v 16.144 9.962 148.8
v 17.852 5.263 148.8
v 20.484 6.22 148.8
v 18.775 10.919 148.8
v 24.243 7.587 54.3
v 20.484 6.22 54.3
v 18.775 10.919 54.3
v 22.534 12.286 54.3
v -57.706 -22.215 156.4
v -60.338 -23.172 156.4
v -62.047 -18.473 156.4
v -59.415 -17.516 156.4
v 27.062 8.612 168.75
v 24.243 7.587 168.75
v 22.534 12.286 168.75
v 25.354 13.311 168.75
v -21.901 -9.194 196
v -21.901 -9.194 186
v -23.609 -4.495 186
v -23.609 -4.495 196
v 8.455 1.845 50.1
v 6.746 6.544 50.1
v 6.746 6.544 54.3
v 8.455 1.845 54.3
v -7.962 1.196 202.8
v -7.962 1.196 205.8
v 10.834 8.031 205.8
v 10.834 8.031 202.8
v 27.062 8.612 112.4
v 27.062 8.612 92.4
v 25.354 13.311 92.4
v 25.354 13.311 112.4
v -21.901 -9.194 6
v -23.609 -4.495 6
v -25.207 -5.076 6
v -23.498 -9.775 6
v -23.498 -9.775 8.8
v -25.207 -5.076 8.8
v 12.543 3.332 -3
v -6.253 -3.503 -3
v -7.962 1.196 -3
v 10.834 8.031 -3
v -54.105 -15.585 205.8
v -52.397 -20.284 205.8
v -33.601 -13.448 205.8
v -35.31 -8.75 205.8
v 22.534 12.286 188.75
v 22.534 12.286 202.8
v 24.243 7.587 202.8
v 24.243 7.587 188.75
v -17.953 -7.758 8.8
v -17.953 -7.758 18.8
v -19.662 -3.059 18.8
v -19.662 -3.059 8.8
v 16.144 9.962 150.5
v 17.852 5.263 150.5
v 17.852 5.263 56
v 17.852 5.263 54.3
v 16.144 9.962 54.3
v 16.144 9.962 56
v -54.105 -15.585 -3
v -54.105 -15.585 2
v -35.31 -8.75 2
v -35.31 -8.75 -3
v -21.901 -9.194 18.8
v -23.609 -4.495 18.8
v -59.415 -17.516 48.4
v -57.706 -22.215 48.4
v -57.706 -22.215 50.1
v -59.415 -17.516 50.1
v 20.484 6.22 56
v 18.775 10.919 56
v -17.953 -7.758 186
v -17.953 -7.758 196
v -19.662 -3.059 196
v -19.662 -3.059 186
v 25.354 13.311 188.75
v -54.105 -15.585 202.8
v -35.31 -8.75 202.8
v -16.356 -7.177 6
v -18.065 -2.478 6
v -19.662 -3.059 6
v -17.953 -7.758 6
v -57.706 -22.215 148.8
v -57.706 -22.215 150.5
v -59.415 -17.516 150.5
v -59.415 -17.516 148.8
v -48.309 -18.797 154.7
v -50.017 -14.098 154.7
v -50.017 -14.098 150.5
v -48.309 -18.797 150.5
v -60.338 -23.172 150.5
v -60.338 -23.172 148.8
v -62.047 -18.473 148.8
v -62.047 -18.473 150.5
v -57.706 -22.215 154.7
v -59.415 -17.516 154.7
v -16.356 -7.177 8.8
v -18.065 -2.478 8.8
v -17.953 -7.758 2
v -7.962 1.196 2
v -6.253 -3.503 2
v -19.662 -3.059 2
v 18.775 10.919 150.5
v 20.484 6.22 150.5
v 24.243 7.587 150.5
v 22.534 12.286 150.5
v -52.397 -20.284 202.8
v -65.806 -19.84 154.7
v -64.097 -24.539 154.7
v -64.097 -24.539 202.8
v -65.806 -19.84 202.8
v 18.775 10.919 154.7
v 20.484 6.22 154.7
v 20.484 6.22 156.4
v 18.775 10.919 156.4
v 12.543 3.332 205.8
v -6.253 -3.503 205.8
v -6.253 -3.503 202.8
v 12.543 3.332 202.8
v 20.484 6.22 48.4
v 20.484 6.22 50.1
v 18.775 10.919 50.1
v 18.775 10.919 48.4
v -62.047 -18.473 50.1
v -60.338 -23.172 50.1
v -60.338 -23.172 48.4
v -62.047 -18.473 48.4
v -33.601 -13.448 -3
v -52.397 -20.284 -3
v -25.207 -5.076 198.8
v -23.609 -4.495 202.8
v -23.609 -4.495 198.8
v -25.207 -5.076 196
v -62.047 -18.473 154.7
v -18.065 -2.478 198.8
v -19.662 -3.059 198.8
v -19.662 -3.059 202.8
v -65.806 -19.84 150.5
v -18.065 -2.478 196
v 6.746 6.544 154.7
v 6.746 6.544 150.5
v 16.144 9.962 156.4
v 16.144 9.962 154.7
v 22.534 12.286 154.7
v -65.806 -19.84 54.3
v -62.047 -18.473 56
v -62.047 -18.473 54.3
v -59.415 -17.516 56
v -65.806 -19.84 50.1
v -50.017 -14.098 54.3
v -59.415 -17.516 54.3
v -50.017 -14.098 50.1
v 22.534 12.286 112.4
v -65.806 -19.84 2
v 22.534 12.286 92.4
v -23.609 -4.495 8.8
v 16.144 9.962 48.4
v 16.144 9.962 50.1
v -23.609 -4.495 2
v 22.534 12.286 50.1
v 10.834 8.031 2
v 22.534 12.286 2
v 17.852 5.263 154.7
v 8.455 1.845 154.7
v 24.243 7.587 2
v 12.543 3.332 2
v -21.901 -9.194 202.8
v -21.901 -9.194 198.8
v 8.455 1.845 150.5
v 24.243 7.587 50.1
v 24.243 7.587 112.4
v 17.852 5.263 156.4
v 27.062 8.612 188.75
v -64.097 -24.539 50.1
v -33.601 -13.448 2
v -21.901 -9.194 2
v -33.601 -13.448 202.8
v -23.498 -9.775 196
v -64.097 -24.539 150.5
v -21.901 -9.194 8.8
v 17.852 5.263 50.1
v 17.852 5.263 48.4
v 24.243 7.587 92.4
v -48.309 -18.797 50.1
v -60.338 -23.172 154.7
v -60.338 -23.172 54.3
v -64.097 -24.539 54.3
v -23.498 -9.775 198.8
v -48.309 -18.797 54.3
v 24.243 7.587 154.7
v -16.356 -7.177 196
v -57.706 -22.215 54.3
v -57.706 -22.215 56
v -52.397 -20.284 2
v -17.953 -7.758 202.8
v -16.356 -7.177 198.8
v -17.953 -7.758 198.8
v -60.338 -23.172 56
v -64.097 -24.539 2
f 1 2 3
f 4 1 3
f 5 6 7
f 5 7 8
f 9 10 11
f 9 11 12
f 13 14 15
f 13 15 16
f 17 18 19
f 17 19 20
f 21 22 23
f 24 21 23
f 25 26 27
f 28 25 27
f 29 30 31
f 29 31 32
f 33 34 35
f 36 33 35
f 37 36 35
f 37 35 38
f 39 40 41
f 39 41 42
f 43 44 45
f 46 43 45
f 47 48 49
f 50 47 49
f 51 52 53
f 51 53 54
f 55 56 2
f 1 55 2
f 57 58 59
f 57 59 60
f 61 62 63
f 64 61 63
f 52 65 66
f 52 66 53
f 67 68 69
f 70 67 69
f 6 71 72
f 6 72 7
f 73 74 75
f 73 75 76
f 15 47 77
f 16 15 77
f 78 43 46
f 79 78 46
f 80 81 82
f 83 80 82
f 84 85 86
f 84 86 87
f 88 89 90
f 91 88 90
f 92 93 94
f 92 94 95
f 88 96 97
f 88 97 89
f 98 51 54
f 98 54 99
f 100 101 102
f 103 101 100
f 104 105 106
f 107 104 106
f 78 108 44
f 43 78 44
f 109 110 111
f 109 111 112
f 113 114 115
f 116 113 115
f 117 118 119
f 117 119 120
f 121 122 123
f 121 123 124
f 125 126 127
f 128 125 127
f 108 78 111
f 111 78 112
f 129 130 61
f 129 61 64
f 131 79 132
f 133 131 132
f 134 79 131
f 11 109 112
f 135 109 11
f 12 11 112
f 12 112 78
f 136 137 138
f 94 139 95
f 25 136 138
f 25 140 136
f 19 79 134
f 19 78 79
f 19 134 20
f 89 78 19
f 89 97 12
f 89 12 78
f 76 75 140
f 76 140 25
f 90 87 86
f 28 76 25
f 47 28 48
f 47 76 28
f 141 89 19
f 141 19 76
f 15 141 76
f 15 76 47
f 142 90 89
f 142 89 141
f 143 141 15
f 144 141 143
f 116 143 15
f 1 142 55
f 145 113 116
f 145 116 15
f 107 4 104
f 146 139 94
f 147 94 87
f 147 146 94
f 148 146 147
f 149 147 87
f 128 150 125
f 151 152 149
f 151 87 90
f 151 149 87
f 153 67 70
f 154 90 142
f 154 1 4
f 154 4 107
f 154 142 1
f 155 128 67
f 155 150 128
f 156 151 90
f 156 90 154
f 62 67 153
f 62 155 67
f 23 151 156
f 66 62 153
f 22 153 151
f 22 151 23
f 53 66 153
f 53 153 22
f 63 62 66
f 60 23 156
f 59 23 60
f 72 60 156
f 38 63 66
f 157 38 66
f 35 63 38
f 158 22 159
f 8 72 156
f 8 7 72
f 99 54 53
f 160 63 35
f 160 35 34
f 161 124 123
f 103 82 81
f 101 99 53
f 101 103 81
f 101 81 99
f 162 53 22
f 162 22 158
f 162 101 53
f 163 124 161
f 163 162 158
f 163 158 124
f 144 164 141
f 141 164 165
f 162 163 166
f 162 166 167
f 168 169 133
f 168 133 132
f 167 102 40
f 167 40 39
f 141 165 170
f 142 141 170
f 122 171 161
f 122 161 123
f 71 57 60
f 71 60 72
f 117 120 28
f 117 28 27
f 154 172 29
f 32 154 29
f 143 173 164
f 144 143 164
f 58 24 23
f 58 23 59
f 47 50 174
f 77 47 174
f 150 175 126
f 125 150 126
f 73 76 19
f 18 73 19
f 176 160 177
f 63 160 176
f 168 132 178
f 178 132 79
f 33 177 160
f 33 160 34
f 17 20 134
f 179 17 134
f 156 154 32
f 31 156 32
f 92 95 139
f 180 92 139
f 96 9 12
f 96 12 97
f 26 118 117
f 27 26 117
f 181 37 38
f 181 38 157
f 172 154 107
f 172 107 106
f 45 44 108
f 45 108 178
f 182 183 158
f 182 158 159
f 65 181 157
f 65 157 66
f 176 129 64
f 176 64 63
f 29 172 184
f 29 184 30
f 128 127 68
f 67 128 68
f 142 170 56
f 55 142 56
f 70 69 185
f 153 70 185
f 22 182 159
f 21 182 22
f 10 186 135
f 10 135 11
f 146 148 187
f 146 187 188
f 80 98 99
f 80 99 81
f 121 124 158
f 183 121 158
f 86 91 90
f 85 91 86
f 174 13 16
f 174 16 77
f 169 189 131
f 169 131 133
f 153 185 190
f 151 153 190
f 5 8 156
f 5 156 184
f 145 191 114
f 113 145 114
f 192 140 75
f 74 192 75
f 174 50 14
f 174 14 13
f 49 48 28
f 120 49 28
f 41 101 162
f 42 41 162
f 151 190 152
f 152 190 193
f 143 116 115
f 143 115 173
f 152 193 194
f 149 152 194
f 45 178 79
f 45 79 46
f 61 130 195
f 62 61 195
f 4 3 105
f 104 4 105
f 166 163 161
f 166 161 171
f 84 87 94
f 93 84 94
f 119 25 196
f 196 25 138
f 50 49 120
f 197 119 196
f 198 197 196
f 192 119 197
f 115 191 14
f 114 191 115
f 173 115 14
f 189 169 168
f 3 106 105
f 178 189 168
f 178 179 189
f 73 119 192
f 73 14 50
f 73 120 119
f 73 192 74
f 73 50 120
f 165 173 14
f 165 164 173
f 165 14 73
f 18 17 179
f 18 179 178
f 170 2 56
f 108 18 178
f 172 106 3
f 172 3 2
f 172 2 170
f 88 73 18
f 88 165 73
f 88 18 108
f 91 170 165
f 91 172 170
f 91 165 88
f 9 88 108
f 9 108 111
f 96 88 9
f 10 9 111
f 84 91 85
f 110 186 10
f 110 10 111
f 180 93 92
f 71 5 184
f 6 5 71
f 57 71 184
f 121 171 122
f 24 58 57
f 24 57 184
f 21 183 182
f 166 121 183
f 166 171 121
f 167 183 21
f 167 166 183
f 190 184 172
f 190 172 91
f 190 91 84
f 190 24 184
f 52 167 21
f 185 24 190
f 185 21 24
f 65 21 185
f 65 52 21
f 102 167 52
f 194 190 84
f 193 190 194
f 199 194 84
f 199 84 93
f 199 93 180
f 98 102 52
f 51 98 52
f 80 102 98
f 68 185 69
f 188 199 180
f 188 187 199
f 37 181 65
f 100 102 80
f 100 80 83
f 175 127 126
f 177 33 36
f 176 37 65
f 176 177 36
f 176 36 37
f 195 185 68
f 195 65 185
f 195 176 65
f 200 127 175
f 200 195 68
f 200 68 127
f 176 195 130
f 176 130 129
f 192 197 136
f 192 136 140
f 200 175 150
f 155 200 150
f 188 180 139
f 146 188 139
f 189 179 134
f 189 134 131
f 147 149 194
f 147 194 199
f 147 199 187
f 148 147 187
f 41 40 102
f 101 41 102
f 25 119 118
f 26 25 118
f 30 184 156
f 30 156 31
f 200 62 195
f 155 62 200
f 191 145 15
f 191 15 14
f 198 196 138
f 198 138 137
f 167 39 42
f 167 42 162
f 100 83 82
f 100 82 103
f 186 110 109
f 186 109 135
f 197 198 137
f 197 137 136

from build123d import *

# Parameters (mm, degrees)
BOSS_EXTRUDE1_DEPTH = 200.8
CUT_EXTRUDE3_DEPTH  = 36.191113799
SKETCH5_W           = 20
SKETCH5_H           = 5
SKETCH5_W_2         = 3
SKETCH5_H_2         = 20
SKETCH5_H_3         = 3
BOSS_EXTRUDE2_DEPTH = 5


with BuildPart() as part:
    # Sketch2 → Boss-Extrude1 (new body)
    with BuildSketch(Plane.XY.offset(2)):
        Polygon((22.534227339, 12.285835046), (24.243029584, 7.58689954), (-64.096957923, -24.53858267), (-65.805760168, -19.839647165), align=None)
    extrude(amount=BOSS_EXTRUDE1_DEPTH)

    # Sketch4 → Cut-Extrude3 (cut, through all)
    with BuildSketch(Plane(origin=(0.394814778, -1.085678102, 0), x_dir=(-0.939787101, -0.341760449, 0), z_dir=(0.341760449, -0.939787101, 0))):
        Polygon((19.52381131, -2), (23.72381131, -2), (23.72381131, -6), (25.42381131, -6), (25.42381131, -8.8), (23.72381131, -8.8), (23.72381131, -18.8), (19.52381131, -18.8), (19.52381131, -8.8), (17.82381131, -8.8), (17.82381131, -6), (19.52381131, -6), align=None)
        Polygon((-25.37618869, -54.3), (-25.37618869, -50.1), (-21.37618869, -50.1), (-21.37618869, -48.4), (-18.57618869, -48.4), (-18.57618869, -50.1), (-8.57618869, -50.1), (-8.57618869, -54.3), (-18.57618869, -54.3), (-18.57618869, -56), (-21.37618869, -56), (-21.37618869, -54.3), align=None)
        Polygon((23.72381131, -202.8), (19.52381131, -202.8), (19.52381131, -198.8), (17.82381131, -198.8), (17.82381131, -196), (19.52381131, -196), (19.52381131, -186), (23.72381131, -186), (23.72381131, -196), (25.42381131, -196), (25.42381131, -198.8), (23.72381131, -198.8), align=None)
        Polygon((-21.37618869, -154.7), (-21.37618869, -156.4), (-18.57618869, -156.4), (-18.57618869, -154.7), (-8.57618869, -154.7), (-8.57618869, -150.5), (-18.57618869, -150.5), (-18.57618869, -148.8), (-21.37618869, -148.8), (-21.37618869, -150.5), (-25.37618869, -150.5), (-25.37618869, -154.7), align=None)
        Polygon((68.62381131, -150.5), (68.62381131, -154.7), (64.62381131, -154.7), (64.62381131, -156.4), (61.82381131, -156.4), (61.82381131, -154.7), (51.82381131, -154.7), (51.82381131, -150.5), (61.82381131, -150.5), (61.82381131, -148.8), (64.62381131, -148.8), (64.62381131, -150.5), align=None)
        Polygon((64.62381131, -50.1), (64.62381131, -48.4), (61.82381131, -48.4), (61.82381131, -50.1), (51.82381131, -50.1), (51.82381131, -54.3), (61.82381131, -54.3), (61.82381131, -56), (64.62381131, -56), (64.62381131, -54.3), (68.62381131, -54.3), (68.62381131, -50.1), align=None)
    extrude(amount=-CUT_EXTRUDE3_DEPTH, mode=Mode.SUBTRACT)

    # Sketch5 → Boss-Extrude2 (add)
    with BuildSketch(Plane(origin=(0.394814778, -1.085678102, 0), x_dir=(0.939787101, 0.341760449, 0), z_dir=(0.341760449, -0.939787101, 0))):
        with Locations((2.92618869, -0.5)):
            Rectangle(SKETCH5_W, SKETCH5_H)
        with Locations((-46.17381131, -0.5)):
            Rectangle(SKETCH5_W, SKETCH5_H)
        with Locations((26.87618869, 102.4)):
            Rectangle(SKETCH5_W_2, SKETCH5_H_2)
        with Locations((26.87618869, 178.75)):
            Rectangle(SKETCH5_W_2, SKETCH5_H_2)
        with Locations((2.92618869, 204.3)):
            Rectangle(SKETCH5_W, SKETCH5_H_3)
        with Locations((-46.17381131, 204.3)):
            Rectangle(SKETCH5_W, SKETCH5_H_3)
    extrude(amount=-BOSS_EXTRUDE2_DEPTH)


solid = part.part
